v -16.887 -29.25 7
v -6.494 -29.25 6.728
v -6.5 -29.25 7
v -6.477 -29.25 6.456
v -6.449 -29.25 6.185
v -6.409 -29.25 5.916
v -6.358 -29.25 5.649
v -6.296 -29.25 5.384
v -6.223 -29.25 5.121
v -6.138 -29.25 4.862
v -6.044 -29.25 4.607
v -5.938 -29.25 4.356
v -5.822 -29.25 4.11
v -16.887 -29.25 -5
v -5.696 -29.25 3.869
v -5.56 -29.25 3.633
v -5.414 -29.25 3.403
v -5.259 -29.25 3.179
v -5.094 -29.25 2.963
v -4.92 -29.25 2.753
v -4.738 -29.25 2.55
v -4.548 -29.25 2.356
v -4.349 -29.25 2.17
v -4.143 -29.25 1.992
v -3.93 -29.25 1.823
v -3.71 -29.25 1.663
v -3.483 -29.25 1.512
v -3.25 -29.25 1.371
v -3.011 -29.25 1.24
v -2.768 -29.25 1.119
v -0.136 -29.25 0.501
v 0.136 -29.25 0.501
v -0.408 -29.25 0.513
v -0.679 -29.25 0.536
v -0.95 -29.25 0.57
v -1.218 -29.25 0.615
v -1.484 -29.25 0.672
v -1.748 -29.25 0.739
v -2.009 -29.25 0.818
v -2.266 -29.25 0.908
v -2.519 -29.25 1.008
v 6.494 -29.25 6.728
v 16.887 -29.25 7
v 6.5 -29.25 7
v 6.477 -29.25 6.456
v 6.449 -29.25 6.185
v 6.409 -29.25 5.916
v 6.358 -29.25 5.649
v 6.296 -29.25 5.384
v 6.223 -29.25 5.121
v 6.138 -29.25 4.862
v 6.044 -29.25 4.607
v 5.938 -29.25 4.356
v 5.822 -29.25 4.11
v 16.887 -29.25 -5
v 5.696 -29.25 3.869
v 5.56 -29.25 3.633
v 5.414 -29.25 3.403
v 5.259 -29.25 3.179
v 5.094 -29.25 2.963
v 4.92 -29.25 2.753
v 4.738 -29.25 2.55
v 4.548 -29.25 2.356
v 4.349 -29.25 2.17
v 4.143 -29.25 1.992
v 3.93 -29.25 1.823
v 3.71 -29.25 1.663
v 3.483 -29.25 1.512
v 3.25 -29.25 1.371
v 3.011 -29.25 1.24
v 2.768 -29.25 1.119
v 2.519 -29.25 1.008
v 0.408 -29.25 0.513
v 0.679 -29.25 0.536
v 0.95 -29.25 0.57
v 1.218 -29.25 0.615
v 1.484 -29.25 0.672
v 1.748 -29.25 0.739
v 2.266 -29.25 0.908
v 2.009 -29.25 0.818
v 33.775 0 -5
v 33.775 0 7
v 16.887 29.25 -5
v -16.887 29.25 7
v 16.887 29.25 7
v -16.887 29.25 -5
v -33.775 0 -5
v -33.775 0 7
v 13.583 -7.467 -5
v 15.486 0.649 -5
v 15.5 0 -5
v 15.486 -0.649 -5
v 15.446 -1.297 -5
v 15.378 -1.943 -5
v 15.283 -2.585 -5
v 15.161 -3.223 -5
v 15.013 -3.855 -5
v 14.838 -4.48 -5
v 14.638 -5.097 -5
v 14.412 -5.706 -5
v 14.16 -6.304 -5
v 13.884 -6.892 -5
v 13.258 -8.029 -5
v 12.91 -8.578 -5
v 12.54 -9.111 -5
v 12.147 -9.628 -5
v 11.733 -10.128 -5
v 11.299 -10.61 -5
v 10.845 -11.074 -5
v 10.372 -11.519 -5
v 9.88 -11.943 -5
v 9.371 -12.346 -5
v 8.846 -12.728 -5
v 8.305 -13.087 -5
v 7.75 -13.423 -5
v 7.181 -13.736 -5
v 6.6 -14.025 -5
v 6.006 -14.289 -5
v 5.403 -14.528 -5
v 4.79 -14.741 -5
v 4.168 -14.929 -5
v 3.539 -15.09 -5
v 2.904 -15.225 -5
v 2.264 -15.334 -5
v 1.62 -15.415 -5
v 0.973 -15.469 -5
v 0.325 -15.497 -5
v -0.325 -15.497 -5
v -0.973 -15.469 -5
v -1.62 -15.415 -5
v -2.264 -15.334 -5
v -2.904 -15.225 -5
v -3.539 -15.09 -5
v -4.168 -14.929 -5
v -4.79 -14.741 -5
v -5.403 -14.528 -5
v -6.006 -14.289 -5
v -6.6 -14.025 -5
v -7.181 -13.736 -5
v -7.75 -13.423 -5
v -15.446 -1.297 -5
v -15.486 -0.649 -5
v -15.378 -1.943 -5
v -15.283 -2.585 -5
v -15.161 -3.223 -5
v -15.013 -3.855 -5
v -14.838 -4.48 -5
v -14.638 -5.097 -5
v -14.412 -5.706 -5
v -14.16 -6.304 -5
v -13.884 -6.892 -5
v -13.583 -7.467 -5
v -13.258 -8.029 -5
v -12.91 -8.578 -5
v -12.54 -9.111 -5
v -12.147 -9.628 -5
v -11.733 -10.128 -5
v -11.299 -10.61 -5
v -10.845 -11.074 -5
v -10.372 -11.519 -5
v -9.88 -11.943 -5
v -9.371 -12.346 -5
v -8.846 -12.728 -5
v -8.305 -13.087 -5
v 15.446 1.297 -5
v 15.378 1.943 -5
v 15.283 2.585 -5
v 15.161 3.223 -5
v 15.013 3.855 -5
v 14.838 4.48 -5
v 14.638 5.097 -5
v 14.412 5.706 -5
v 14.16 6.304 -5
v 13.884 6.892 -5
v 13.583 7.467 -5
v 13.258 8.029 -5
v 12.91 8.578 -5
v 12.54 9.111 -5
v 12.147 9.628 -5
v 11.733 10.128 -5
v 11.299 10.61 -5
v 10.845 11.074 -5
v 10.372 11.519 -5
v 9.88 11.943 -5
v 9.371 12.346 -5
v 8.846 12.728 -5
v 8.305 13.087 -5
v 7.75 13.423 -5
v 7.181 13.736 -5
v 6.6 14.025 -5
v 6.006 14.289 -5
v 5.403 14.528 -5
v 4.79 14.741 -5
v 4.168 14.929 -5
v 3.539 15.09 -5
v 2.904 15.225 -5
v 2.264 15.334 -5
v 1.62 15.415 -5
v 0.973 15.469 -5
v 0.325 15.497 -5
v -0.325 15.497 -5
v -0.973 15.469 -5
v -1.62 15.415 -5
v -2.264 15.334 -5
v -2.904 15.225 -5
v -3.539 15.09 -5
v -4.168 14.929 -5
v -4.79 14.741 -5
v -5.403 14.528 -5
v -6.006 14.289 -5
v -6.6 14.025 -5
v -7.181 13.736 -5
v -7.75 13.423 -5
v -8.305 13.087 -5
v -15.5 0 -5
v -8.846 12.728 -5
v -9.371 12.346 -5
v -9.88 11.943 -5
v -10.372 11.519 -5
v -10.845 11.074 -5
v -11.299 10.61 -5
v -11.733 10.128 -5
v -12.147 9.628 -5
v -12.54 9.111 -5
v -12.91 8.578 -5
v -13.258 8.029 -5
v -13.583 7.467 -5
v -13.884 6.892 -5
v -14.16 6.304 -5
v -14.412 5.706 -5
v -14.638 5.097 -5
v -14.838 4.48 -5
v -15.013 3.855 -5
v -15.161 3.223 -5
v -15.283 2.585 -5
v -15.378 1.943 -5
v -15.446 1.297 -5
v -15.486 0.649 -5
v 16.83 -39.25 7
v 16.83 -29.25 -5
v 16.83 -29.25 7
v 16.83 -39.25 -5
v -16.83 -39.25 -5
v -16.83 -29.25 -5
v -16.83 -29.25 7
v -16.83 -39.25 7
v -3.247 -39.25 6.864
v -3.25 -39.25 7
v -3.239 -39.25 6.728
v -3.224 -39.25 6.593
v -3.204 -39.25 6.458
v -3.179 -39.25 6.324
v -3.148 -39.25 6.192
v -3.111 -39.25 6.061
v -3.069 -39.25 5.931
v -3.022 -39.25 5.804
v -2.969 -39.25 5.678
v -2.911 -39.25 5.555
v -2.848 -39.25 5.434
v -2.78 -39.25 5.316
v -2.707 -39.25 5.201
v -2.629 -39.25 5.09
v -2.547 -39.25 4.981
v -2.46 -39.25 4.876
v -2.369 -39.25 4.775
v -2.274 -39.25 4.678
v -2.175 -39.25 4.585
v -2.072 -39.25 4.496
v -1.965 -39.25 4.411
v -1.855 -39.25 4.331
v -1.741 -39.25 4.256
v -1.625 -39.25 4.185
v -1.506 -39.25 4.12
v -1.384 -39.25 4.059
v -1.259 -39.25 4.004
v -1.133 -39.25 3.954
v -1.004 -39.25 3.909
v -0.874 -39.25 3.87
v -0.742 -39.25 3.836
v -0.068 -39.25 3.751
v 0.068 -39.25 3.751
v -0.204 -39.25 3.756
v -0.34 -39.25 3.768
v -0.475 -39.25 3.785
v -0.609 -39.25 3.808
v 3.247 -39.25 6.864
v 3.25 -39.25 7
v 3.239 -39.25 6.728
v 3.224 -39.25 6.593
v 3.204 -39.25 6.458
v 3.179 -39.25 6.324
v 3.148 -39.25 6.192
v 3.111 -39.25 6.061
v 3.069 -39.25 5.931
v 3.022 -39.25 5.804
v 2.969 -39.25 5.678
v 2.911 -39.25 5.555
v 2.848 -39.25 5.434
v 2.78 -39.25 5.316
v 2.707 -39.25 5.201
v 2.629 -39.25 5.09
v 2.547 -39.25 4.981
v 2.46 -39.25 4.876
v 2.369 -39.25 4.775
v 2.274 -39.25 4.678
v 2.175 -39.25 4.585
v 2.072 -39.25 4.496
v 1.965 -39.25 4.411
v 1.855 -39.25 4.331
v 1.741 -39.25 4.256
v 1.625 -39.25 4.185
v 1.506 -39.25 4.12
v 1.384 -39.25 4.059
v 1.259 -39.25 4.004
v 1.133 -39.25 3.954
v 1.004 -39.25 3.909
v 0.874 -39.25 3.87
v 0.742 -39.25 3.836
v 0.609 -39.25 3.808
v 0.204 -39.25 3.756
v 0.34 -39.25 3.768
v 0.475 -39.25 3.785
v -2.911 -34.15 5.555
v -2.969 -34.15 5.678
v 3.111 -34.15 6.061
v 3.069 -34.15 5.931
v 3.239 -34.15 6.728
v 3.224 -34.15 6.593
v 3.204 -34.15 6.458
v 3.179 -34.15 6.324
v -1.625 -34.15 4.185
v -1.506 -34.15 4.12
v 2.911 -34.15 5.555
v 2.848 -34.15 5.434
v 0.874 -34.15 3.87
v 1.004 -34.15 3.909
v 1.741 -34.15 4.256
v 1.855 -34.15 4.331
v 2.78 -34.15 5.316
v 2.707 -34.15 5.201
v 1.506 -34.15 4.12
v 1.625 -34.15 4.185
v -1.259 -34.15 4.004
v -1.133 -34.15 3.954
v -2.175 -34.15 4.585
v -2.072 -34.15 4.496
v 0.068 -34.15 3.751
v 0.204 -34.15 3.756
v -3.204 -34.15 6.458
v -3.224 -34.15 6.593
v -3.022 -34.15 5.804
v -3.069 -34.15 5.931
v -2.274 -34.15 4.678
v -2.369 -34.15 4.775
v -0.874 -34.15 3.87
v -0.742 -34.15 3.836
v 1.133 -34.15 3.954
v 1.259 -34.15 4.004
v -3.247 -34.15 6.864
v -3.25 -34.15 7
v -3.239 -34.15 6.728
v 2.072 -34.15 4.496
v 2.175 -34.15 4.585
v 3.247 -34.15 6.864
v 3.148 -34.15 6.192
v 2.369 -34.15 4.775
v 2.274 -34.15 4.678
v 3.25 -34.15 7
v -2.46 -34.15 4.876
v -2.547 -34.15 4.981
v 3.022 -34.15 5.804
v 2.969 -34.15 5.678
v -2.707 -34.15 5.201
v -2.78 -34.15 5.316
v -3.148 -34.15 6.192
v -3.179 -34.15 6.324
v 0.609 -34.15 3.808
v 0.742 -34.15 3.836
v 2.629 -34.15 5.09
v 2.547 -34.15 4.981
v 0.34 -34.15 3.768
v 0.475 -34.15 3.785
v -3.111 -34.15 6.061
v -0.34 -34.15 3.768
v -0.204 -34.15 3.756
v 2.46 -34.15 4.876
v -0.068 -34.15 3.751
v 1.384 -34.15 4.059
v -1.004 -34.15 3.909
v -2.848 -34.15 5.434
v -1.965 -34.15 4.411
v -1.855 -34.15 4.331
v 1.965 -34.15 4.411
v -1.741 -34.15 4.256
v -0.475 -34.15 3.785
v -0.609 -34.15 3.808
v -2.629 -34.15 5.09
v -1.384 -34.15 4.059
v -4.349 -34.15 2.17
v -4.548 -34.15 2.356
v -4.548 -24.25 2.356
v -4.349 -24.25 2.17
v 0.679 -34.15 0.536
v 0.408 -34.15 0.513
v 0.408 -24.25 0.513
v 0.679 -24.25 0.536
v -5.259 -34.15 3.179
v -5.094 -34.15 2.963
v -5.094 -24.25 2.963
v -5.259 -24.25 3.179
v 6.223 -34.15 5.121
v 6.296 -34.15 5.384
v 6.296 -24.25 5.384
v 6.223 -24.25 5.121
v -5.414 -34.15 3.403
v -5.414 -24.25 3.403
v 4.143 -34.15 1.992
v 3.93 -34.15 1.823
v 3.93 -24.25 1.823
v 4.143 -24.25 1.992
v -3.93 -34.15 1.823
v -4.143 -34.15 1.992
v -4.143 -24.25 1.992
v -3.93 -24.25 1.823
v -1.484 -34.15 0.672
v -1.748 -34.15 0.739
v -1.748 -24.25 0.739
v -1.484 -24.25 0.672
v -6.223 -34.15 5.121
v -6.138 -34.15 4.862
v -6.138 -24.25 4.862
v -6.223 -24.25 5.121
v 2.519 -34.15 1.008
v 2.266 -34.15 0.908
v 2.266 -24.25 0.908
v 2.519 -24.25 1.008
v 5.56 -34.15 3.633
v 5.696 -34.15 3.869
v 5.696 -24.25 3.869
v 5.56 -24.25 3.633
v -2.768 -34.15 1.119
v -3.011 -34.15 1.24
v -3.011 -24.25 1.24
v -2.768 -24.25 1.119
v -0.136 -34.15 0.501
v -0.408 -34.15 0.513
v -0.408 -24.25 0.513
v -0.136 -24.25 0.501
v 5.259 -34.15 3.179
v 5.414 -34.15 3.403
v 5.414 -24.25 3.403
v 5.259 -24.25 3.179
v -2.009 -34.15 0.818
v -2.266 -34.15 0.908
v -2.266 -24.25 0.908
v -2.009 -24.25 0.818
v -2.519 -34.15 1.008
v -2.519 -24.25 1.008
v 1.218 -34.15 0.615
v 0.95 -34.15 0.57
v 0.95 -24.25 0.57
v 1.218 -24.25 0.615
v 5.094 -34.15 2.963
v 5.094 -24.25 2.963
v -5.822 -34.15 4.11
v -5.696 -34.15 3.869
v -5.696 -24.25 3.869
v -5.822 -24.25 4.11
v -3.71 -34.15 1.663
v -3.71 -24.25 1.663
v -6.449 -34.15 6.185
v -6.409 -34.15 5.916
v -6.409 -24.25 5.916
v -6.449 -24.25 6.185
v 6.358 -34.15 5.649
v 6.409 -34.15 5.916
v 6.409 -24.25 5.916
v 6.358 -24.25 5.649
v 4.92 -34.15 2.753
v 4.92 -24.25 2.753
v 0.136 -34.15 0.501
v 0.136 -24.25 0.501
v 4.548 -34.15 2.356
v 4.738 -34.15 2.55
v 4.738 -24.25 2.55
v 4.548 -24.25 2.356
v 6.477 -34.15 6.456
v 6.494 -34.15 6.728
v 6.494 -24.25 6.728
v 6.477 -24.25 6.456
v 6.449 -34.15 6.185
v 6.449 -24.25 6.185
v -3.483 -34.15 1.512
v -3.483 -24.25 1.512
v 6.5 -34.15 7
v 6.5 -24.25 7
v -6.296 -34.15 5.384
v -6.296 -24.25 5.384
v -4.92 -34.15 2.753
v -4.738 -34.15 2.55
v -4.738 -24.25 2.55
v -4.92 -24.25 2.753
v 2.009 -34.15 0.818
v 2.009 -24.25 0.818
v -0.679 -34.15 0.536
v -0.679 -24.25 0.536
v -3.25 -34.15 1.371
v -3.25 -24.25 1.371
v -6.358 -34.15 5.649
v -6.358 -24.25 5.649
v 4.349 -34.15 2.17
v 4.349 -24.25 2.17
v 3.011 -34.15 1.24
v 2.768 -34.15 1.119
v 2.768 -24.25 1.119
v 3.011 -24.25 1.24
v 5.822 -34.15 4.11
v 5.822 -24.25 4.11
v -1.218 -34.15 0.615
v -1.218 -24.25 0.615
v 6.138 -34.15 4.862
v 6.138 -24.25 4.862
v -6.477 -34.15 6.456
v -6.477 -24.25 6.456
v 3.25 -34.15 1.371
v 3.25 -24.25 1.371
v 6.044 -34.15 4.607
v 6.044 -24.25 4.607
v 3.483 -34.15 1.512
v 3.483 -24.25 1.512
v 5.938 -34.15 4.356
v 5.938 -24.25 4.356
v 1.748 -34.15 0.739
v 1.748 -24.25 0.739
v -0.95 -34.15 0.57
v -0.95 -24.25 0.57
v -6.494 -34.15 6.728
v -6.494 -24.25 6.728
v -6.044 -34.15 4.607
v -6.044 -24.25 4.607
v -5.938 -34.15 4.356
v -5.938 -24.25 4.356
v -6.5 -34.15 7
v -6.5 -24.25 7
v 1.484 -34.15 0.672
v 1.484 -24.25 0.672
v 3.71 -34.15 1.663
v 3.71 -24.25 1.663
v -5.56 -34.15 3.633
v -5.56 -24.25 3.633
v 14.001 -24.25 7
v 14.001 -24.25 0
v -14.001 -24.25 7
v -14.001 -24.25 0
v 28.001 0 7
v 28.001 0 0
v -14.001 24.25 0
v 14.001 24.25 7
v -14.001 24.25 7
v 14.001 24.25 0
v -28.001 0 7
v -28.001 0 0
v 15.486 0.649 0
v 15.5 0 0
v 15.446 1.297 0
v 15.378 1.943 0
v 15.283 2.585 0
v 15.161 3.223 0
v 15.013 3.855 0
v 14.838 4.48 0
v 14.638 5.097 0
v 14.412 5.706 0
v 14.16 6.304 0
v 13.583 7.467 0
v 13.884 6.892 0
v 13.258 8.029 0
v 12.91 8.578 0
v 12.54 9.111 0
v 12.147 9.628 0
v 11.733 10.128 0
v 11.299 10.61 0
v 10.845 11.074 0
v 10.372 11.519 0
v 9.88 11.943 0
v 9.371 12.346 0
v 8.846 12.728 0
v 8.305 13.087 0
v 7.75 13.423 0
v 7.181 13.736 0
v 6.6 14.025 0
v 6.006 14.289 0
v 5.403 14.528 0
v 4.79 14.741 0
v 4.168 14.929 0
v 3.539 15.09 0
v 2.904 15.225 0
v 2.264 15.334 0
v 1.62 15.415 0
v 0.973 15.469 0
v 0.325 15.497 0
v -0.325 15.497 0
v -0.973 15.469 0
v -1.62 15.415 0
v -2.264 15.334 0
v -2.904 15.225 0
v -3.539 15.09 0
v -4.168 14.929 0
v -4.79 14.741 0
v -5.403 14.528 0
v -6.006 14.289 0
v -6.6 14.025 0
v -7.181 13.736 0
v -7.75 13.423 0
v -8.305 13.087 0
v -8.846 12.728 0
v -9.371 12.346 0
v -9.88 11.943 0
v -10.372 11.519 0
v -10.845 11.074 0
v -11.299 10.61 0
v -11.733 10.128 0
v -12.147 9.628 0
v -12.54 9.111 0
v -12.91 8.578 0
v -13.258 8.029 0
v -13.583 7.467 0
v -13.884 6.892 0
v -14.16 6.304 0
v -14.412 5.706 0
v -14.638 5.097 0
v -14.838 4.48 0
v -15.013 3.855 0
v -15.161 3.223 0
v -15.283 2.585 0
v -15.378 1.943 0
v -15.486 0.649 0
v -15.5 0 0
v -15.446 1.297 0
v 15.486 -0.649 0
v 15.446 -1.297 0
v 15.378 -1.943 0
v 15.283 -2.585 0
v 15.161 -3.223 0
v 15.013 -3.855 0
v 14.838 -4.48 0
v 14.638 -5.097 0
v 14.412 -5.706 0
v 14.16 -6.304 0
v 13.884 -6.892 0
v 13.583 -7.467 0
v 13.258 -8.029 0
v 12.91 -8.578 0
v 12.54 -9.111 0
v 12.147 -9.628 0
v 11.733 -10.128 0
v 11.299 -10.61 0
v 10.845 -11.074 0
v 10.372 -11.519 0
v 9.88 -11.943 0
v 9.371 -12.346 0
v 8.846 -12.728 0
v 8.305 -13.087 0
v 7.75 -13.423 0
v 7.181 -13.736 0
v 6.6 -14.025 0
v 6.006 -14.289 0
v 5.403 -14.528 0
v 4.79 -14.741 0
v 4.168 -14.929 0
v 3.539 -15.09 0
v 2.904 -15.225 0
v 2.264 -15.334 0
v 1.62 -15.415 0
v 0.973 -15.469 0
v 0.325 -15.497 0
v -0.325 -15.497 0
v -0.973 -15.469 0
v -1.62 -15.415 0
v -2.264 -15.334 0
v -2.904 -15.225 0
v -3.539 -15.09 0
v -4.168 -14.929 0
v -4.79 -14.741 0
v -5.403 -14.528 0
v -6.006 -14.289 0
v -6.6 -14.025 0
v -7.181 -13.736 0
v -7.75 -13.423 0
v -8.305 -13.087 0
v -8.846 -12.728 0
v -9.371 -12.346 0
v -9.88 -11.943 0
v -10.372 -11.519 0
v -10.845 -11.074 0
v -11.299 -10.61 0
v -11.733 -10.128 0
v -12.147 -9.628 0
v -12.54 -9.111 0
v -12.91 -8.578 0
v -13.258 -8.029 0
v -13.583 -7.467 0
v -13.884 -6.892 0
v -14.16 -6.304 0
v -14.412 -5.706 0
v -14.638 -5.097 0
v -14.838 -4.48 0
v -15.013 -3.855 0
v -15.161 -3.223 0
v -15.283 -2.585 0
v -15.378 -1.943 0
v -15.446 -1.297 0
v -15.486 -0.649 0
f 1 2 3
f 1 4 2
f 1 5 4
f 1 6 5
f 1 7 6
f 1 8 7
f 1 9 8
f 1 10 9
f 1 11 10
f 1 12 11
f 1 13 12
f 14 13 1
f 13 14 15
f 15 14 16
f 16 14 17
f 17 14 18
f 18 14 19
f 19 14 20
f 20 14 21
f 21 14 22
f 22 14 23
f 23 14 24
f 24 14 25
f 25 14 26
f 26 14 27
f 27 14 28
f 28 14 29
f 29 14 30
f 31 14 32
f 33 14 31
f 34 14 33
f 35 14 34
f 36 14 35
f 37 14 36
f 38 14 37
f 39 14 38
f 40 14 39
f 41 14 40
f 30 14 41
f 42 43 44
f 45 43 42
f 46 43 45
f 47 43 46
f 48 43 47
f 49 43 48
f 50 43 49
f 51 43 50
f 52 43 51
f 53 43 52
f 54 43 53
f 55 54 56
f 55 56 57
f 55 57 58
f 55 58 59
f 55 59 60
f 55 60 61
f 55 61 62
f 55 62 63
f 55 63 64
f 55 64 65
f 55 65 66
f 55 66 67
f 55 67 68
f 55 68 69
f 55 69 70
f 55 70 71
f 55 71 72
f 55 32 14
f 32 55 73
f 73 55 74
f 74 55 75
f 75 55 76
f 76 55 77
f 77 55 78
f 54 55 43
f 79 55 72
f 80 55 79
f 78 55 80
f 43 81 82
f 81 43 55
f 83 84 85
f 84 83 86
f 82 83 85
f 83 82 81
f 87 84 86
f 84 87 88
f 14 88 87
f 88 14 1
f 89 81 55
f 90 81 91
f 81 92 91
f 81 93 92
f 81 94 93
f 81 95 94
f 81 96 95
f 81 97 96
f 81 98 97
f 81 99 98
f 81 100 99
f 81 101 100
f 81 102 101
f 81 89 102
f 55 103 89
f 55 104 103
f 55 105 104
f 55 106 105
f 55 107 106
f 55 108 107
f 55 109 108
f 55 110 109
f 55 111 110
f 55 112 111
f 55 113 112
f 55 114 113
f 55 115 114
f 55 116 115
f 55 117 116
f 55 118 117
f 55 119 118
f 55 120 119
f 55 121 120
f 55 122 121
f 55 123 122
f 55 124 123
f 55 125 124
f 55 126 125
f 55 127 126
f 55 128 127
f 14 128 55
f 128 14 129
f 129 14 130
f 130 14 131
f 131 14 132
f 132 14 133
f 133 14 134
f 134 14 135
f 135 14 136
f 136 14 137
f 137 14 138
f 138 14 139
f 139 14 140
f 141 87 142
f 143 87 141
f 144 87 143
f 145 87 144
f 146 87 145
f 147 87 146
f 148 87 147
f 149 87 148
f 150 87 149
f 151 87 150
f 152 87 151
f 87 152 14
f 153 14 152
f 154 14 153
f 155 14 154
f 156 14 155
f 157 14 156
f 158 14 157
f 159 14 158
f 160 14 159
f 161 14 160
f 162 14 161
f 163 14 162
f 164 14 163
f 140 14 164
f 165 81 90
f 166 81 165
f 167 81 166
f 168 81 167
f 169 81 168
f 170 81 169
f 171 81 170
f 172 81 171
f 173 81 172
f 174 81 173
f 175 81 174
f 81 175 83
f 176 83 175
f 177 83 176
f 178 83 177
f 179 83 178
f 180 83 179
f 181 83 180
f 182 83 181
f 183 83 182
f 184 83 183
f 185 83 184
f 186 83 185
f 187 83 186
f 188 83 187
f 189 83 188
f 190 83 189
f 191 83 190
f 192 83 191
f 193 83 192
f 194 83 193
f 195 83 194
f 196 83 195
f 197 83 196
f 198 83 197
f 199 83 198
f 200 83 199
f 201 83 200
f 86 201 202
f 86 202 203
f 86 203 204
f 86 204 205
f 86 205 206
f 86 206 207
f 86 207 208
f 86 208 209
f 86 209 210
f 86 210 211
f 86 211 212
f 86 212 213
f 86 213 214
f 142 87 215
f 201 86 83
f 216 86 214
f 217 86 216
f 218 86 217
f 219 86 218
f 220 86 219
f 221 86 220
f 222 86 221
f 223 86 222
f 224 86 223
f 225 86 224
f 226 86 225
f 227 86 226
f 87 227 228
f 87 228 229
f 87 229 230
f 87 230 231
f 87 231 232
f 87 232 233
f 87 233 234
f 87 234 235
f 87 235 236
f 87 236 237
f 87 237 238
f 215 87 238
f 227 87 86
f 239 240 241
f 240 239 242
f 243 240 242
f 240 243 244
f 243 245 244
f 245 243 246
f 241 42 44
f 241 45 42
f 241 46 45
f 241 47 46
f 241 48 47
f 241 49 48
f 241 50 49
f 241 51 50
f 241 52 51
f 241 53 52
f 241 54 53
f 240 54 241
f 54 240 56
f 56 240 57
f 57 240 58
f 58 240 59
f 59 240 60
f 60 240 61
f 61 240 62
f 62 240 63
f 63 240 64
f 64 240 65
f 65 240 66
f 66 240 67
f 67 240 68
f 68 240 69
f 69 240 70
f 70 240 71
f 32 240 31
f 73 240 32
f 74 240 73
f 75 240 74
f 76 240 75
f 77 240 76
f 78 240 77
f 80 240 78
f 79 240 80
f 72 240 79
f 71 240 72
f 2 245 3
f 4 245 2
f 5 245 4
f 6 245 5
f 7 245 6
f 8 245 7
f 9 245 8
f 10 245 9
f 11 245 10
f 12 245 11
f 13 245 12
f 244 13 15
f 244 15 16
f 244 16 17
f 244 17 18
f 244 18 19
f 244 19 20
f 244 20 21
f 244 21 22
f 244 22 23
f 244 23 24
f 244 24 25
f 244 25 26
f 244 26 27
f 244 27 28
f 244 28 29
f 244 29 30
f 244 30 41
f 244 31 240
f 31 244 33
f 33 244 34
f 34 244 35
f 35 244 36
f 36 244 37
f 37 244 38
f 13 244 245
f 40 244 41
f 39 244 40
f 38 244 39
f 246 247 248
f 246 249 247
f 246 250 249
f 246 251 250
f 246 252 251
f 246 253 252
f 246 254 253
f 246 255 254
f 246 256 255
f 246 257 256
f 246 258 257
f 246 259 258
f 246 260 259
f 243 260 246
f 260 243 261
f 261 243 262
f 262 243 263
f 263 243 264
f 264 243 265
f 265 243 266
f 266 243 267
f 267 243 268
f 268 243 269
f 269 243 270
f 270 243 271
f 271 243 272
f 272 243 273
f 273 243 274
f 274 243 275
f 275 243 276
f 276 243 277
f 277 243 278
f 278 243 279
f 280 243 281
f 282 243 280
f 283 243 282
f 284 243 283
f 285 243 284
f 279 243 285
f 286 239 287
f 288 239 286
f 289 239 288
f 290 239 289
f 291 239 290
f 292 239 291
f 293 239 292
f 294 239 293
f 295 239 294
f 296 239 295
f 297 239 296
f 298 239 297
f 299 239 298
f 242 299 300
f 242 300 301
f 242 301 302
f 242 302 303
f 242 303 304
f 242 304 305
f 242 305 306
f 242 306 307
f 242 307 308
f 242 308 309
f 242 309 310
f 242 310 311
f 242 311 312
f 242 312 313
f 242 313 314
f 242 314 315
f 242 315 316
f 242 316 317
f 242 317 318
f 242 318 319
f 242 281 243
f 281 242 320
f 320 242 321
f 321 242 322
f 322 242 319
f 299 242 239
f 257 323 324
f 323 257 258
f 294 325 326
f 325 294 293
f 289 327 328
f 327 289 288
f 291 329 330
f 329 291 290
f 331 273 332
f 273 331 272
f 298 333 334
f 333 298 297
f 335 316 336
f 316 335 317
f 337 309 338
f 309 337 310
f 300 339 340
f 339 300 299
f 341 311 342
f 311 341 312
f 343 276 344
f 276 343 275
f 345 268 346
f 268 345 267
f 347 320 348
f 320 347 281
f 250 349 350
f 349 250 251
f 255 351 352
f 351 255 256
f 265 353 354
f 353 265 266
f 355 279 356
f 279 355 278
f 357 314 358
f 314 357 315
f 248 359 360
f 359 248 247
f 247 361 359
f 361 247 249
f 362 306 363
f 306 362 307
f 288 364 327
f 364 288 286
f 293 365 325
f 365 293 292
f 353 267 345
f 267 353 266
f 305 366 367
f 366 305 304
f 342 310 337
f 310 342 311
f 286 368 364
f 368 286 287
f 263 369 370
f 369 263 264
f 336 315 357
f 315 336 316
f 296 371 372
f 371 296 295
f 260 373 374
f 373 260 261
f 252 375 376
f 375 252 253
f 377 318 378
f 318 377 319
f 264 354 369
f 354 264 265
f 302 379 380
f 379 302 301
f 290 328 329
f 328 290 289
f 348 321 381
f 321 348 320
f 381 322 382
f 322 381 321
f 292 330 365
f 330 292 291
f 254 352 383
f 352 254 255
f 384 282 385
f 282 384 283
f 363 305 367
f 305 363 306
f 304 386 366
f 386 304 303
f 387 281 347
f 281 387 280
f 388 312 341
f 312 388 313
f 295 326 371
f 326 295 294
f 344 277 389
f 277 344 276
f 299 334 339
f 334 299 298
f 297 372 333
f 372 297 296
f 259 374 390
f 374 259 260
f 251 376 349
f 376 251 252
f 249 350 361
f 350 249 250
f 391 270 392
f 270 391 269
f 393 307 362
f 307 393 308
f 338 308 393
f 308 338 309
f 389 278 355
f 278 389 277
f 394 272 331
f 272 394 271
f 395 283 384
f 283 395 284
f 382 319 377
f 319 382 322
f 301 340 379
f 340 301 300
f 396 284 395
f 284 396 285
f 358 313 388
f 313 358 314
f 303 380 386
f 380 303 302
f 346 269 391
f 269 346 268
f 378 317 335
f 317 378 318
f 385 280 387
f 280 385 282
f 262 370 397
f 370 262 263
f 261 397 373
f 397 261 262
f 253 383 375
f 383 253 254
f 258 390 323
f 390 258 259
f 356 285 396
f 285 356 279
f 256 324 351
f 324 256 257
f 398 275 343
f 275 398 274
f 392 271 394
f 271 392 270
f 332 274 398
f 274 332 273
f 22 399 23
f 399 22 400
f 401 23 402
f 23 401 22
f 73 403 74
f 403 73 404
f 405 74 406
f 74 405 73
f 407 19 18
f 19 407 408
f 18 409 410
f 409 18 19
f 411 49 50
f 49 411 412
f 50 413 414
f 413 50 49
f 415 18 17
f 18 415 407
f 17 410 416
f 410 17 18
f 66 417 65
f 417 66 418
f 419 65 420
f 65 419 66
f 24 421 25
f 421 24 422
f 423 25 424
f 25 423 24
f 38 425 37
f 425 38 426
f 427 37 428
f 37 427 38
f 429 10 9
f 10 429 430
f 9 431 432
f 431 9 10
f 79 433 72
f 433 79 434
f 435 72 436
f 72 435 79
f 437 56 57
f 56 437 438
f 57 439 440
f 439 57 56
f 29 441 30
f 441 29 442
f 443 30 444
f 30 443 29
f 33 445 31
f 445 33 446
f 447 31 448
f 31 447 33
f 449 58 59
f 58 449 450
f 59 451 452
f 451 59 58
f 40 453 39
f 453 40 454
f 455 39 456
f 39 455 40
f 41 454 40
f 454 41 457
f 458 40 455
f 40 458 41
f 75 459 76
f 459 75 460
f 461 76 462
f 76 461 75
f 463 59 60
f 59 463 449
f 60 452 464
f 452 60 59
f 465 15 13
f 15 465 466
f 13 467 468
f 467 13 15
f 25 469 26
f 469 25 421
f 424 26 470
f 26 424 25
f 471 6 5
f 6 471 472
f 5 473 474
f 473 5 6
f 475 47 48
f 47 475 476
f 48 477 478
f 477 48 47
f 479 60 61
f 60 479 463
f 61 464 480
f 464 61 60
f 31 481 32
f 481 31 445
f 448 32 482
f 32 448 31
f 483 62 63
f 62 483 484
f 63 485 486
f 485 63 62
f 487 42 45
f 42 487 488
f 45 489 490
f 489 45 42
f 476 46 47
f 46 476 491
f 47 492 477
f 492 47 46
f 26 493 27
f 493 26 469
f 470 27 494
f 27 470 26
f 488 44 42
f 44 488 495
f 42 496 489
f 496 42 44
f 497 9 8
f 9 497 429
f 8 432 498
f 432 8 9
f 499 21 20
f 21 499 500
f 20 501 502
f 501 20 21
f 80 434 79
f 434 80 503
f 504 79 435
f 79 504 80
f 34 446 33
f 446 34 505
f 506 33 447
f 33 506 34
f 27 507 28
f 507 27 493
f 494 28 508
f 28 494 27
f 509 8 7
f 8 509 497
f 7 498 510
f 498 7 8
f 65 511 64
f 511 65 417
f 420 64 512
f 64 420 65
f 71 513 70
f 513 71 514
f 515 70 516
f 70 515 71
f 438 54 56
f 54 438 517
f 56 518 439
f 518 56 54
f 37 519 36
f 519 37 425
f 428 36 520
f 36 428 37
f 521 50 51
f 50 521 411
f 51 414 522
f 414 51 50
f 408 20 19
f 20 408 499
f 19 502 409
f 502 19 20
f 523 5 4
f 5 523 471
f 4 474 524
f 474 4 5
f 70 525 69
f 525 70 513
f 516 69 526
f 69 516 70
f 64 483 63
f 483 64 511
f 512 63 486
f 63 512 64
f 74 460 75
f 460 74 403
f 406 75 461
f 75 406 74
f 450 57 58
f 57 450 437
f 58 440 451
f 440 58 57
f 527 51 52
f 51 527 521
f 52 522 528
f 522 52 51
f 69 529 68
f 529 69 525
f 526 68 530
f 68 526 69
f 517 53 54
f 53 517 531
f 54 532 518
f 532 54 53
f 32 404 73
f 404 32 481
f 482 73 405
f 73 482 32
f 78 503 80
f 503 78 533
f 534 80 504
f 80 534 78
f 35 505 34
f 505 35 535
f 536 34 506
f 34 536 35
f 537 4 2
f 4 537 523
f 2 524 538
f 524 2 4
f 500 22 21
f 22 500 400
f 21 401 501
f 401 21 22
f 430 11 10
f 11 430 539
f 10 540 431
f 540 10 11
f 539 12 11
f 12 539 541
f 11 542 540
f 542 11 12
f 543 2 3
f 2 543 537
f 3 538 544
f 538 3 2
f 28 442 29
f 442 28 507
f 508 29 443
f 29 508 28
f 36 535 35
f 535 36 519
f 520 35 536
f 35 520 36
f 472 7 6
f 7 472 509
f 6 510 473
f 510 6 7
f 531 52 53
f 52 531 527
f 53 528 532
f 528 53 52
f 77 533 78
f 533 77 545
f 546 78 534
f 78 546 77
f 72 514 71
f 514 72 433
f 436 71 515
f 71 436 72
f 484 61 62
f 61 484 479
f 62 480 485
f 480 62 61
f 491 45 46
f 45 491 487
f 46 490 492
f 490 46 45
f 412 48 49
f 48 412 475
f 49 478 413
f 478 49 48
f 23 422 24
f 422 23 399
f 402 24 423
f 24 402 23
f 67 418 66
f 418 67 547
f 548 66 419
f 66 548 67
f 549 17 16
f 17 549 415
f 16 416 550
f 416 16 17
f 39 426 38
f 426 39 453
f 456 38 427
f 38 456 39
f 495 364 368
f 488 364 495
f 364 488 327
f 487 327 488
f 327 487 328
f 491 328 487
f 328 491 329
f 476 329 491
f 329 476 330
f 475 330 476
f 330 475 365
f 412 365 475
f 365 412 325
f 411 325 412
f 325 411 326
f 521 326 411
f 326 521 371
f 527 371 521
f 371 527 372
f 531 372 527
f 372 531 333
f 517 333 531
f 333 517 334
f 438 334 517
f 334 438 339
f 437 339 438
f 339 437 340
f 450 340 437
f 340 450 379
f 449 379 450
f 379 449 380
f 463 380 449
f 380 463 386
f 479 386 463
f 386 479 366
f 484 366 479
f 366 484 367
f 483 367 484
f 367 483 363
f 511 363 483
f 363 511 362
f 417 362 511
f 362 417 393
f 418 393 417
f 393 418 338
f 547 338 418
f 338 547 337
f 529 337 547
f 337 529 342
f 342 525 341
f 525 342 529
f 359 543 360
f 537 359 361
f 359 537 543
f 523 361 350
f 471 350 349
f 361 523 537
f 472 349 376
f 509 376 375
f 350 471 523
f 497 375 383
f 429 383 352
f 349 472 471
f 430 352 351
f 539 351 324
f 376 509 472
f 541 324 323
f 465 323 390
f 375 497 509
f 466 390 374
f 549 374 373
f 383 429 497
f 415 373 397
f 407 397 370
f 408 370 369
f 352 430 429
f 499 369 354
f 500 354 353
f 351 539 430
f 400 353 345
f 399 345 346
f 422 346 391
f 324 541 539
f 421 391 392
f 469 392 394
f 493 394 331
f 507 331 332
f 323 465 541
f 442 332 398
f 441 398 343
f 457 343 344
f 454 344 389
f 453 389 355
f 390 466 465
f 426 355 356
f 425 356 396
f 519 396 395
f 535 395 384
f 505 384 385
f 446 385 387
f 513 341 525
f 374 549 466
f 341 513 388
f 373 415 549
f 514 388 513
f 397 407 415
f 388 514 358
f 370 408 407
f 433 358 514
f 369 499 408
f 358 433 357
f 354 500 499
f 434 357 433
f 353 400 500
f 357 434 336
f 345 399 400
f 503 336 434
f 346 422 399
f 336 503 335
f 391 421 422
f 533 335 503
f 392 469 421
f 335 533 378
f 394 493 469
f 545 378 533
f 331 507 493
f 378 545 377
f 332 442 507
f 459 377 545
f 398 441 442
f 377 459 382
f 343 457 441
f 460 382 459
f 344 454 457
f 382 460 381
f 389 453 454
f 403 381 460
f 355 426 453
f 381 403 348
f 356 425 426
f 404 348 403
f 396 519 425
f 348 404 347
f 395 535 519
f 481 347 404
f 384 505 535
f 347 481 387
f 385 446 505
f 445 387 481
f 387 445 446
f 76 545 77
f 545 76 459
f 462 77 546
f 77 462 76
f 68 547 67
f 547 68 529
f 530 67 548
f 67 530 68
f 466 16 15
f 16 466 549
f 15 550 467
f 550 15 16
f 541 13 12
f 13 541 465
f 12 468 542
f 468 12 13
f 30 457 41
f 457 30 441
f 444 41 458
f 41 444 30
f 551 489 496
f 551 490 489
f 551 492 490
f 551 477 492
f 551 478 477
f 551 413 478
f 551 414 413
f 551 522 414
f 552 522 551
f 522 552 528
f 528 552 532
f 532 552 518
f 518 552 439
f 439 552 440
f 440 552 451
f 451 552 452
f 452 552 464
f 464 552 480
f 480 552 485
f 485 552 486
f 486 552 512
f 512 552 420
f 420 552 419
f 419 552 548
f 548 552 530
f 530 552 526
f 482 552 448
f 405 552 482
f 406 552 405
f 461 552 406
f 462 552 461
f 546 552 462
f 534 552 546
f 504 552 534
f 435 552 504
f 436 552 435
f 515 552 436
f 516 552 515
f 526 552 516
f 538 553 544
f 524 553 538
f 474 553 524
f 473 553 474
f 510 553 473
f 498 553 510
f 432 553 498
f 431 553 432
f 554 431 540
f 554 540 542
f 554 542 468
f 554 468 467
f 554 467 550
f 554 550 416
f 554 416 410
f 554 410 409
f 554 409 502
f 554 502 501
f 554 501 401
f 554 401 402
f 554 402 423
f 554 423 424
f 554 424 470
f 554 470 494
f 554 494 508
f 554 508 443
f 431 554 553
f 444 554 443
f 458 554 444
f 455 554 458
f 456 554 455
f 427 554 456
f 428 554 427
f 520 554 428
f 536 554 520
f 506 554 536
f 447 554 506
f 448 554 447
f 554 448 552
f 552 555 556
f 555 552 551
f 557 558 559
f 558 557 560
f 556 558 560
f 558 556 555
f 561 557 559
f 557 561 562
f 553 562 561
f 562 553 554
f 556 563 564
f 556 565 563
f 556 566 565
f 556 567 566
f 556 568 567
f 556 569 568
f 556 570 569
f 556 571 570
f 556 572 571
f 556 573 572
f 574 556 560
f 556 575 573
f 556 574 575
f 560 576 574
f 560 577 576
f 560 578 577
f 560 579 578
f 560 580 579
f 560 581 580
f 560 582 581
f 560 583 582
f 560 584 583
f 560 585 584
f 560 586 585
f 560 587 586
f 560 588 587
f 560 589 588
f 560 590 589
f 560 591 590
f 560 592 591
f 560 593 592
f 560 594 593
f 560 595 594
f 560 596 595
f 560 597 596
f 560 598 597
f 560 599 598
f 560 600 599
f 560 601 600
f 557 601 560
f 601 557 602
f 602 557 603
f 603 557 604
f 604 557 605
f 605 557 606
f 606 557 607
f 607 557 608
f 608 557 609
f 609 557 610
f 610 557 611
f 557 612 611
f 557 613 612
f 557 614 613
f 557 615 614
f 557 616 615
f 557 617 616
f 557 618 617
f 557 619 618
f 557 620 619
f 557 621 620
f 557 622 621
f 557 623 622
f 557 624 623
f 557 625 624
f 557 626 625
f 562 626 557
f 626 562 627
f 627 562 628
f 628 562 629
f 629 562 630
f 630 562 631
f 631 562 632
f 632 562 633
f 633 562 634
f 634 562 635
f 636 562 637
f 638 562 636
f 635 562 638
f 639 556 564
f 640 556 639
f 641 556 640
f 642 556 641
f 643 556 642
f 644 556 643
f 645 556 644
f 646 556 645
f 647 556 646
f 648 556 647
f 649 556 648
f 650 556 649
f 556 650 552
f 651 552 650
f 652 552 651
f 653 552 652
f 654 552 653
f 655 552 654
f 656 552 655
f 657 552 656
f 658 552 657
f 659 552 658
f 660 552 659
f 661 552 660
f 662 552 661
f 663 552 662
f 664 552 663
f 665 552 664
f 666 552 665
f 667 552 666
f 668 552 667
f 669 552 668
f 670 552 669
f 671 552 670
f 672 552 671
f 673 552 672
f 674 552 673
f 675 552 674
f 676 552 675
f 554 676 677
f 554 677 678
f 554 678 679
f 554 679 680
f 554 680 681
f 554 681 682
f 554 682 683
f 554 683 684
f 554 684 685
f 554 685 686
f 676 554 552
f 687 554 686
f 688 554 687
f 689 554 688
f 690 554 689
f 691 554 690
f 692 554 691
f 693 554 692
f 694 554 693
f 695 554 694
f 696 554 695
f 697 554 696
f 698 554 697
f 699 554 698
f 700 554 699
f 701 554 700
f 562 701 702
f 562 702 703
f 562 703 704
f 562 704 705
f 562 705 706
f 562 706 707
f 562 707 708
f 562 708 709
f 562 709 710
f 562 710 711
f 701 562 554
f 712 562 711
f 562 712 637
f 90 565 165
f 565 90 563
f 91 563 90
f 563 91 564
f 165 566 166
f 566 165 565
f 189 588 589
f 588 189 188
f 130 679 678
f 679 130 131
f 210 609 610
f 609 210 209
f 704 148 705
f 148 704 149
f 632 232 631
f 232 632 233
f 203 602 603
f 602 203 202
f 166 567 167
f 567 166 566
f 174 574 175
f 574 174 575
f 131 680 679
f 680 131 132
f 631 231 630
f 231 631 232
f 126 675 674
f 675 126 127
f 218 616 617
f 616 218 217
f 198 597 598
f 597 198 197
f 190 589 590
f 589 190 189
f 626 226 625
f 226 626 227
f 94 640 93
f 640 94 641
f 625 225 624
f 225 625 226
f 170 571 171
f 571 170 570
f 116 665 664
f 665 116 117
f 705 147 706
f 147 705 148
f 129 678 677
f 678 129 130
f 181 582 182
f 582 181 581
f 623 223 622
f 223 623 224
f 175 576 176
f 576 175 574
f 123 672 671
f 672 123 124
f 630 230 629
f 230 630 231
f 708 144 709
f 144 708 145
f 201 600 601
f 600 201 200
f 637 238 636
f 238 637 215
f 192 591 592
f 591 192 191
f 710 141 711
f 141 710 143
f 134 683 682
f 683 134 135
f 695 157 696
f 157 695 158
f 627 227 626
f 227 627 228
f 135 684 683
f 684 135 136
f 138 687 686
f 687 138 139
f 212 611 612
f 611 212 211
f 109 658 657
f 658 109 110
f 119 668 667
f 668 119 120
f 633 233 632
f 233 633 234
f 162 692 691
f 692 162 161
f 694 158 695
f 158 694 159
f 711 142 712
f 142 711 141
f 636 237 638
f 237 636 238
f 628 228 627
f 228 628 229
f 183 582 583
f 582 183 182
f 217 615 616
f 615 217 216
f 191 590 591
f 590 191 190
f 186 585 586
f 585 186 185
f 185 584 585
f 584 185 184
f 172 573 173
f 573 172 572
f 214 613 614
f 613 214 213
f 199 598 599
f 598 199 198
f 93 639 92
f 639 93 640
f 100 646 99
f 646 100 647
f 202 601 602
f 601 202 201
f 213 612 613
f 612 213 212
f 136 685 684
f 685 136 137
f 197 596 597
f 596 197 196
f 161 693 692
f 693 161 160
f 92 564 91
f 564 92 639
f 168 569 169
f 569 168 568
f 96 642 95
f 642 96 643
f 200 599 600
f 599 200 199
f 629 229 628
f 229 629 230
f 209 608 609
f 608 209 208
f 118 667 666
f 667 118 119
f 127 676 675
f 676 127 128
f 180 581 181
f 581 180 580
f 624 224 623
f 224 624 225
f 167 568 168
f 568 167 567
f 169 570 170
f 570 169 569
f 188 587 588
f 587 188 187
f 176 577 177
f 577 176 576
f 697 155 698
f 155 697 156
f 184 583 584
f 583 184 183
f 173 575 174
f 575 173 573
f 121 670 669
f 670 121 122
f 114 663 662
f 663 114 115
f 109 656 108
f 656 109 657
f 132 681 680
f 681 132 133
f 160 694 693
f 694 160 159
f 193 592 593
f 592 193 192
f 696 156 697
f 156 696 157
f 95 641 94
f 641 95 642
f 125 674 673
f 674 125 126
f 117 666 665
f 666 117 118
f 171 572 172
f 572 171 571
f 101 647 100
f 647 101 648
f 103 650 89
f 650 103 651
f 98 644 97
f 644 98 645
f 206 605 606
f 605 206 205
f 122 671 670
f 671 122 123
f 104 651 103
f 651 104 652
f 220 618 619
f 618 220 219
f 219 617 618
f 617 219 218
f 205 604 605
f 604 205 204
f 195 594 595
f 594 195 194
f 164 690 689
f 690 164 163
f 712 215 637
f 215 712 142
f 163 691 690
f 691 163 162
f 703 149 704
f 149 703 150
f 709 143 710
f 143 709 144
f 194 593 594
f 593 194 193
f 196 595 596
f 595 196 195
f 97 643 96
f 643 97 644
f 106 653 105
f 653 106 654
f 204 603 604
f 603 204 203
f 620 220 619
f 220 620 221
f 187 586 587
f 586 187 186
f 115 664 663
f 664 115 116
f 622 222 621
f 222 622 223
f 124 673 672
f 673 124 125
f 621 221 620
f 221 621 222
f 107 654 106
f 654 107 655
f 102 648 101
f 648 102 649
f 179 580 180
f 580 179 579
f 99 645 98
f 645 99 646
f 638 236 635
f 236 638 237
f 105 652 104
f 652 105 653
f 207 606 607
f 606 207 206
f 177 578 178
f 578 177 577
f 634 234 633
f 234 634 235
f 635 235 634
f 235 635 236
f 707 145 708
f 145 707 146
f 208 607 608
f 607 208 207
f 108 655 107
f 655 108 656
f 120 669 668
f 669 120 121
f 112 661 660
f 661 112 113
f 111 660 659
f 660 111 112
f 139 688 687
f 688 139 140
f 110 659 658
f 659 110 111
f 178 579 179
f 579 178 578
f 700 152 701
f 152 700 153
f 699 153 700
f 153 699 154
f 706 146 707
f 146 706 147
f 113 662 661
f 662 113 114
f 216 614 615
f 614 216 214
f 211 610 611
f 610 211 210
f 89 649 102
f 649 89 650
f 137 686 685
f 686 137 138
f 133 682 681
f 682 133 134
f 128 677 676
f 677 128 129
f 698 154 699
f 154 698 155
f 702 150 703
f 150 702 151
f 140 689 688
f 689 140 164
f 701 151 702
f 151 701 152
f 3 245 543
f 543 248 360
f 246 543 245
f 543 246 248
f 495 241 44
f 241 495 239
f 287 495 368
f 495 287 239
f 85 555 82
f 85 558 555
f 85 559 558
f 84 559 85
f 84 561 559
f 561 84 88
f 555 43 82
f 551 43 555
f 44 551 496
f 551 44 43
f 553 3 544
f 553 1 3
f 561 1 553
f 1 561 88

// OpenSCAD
$fn = $preview ? 30 : 150;

// first print: d_cam = 48.5 mm
d_cam = 48.5;  // camera diameter (between 2 flat sides)
y_dist = 15;  // distance between cam and alu profile
t_wall = 5;  // wall thickness


module main() {
	difference() {
		union() {
			// outer diameter
			translate([0, 0, (41 - t_wall) / 2])
				cylinder(h=41 + t_wall, d=(d_cam + t_wall * 2) * 1.1547, center=true, $fn=6);

			// attachement cube
			t_cube = y_dist - t_wall;
			translate([0, -t_cube / 2 - d_cam / 2 - t_wall, (41 - t_wall) / 2])
				cube(size=[33.66, t_cube, 41 + t_wall], center=true);
		}
		// inner diameter
		translate([0, 0, 24])
			cylinder(h=48, d=d_cam * 1.1547, center=true, $fn=6);

		// hole for objective
		cylinder(h=100, d=31, center=true);

		for (z=[7, 33])
			translate([0, -30.15 + 5, z])
				rotate([90, 0, 0]) {
					cylinder(d=6.5, h=40, center=true);
					cylinder(d=13, h=18, center=true);
				}
	}
}

// hardware
module screw() {
	translate([0, 0, -4 + 13])
		cylinder(h=8, d=10, center=true);
	cylinder(h=22, d=6, center=true);
}

// translate([0, -39, 7])
// 	rotate([-90, 0, 0])
// 		screw();

intersection() {
	main();
	translate([0, 0, -50 + 7])
		cube(size=[100, 100, 100], center=true);
}
